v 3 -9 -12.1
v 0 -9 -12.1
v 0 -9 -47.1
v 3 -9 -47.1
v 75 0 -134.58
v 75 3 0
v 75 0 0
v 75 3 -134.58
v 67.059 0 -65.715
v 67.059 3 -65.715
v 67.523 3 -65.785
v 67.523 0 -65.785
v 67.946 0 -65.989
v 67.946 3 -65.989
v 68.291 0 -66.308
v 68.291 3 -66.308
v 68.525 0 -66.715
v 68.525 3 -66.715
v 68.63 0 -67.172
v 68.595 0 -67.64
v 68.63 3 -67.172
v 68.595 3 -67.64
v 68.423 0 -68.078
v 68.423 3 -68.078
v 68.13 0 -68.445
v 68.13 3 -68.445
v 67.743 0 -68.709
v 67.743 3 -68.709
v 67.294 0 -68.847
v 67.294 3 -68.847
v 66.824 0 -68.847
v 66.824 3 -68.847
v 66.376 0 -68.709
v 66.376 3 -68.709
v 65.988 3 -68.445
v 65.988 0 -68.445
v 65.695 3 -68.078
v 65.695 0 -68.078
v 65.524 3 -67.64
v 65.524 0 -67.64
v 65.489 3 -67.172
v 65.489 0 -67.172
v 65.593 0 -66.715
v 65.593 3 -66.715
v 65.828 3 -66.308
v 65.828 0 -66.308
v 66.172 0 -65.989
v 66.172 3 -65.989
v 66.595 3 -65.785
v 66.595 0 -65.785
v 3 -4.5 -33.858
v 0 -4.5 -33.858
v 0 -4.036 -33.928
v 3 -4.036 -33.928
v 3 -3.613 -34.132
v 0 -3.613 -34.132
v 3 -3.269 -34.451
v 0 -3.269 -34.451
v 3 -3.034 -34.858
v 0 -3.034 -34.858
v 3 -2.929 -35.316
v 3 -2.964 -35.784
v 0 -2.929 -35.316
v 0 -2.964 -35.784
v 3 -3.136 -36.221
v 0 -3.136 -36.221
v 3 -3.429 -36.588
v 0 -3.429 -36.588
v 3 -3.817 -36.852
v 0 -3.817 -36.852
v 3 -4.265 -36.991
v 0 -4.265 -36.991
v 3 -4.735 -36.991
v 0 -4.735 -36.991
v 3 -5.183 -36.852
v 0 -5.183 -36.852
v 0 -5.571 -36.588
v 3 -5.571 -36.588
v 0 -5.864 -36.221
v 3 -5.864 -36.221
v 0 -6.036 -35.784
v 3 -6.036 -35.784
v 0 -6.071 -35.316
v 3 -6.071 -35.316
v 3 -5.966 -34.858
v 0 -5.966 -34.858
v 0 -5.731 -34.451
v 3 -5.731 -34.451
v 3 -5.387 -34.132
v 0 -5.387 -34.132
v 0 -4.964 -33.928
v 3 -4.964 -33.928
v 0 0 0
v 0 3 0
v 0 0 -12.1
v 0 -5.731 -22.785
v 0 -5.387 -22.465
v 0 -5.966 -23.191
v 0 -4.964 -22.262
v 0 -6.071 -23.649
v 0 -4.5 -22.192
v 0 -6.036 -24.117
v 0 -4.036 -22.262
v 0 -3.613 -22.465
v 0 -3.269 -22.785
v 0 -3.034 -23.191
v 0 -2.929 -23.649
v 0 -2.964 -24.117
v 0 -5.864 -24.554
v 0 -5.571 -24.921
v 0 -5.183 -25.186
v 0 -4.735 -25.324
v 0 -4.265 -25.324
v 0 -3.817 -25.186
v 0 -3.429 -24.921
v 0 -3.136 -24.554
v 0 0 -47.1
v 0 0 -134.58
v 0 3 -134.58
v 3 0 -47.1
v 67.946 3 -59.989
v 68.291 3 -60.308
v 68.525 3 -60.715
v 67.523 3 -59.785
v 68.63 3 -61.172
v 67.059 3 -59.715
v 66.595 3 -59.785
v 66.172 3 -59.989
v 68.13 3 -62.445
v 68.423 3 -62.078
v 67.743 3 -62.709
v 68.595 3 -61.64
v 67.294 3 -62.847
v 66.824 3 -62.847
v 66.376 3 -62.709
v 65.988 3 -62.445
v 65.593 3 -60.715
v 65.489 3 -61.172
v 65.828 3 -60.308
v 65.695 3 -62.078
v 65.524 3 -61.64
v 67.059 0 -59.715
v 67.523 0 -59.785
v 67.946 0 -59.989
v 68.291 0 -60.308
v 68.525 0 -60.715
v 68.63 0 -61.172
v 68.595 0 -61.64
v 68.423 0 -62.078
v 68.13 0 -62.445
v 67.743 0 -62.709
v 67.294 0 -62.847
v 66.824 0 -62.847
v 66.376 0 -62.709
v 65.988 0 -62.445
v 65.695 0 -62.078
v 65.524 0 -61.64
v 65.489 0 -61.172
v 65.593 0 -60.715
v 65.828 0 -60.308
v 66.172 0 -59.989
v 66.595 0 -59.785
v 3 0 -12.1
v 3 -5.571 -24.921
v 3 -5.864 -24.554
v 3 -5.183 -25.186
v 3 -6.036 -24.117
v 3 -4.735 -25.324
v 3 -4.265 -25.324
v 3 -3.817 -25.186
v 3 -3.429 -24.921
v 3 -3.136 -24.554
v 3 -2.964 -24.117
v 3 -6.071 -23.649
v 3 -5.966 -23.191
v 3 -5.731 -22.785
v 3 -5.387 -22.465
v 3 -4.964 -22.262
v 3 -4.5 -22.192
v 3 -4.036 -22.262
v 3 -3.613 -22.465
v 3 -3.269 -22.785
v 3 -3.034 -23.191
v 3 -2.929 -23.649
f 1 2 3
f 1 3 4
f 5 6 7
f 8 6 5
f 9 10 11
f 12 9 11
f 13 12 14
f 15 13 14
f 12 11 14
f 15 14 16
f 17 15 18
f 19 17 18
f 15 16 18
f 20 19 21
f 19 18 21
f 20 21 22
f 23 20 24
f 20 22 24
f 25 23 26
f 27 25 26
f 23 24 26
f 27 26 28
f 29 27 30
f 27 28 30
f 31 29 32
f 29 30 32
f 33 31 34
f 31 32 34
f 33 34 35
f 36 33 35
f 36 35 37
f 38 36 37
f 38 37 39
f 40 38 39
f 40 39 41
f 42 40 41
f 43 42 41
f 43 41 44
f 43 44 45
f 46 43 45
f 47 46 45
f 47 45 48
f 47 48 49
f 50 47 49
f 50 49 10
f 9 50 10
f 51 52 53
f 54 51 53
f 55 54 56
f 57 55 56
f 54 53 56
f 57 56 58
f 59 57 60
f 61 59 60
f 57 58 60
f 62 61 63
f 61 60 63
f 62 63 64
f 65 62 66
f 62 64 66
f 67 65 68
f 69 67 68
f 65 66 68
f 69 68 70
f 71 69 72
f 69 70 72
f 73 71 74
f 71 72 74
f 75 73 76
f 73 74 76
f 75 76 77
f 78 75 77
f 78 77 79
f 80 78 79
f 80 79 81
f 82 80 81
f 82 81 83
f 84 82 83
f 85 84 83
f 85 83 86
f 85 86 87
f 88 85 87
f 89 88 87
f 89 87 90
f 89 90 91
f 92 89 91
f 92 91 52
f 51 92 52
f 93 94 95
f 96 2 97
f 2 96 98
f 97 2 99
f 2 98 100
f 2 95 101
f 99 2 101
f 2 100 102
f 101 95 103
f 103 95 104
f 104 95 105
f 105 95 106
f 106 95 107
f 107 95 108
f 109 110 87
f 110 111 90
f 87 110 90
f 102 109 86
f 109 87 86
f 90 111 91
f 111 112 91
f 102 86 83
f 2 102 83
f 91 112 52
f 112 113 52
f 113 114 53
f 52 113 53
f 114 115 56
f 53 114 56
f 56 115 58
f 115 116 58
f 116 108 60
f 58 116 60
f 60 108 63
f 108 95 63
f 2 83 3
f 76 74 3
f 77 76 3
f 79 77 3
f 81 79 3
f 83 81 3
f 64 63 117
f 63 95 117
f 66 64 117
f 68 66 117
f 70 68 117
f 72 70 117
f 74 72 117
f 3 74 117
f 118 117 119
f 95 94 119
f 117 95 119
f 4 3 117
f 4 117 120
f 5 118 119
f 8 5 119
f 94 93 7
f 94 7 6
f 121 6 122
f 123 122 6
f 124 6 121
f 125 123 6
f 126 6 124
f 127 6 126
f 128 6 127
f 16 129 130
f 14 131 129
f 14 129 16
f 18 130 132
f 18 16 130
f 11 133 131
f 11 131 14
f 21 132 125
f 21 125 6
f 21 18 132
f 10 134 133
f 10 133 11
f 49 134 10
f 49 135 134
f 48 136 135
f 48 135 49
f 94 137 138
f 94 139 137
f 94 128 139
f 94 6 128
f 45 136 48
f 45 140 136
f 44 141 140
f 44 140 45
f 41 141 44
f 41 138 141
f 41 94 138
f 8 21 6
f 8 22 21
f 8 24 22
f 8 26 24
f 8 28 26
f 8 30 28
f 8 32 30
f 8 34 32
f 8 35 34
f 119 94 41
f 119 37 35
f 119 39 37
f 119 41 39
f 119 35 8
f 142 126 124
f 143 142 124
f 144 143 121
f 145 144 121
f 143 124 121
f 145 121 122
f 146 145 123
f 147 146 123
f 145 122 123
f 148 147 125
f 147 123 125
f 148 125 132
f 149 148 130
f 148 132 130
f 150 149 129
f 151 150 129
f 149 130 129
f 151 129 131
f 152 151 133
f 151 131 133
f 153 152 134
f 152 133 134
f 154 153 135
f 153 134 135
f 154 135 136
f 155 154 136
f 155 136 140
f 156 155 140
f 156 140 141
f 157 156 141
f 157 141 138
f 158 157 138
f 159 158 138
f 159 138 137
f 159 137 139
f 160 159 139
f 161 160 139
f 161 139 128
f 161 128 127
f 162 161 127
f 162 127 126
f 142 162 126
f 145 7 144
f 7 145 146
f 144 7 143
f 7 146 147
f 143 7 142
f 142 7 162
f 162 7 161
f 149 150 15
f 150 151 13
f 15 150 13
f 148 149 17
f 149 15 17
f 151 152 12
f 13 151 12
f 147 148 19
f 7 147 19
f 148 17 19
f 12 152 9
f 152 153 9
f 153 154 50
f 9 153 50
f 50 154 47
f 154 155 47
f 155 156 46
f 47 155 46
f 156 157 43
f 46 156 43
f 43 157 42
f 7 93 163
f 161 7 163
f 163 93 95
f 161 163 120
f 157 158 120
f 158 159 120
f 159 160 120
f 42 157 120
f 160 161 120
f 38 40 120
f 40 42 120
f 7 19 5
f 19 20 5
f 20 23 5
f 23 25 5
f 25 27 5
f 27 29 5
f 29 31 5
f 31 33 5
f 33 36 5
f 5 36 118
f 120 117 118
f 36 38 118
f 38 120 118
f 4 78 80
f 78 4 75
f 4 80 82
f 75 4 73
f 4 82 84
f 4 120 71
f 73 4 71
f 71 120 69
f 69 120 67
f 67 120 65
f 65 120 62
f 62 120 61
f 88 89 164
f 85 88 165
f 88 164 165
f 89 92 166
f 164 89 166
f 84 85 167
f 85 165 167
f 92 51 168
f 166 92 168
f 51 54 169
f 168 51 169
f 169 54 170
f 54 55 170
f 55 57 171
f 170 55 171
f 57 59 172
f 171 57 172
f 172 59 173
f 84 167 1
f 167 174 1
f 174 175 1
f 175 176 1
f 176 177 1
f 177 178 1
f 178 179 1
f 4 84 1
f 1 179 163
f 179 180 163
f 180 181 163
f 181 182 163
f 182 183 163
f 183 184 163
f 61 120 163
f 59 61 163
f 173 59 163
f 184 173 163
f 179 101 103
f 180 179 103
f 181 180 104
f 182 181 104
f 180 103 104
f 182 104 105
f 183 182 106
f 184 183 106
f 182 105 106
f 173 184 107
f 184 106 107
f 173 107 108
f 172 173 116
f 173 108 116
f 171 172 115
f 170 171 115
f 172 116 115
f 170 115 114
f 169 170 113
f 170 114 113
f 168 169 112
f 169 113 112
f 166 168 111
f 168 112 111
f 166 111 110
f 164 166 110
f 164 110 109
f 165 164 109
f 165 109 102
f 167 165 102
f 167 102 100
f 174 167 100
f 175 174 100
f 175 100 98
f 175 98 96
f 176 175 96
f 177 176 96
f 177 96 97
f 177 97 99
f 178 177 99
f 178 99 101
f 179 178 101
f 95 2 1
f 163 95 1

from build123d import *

# Parameters (mm, degrees)
SKETCH1_W           = 134.58
SKETCH1_H           = 3
BOSS_EXTRUDE1_DEPTH = 75
SKETCH2_W           = 3
SKETCH2_H           = 35
BOSS_EXTRUDE2_DEPTH = 9
SKETCH3_R           = 1.575
CUT_EXTRUDE1_DEPTH  = 155.330089095
SKETCH5_R           = 1.575
CUT_EXTRUDE2_DEPTH  = 155.534062265


with BuildPart() as part:
    # Sketch1 → Boss-Extrude1 (new body)
    with BuildSketch(Plane(origin=(0, 0, 0), x_dir=(0, 0, -1), z_dir=(1, 0, 0))):
        with Locations((67.29, 1.5)):
            Rectangle(SKETCH1_W, SKETCH1_H)
    extrude(amount=BOSS_EXTRUDE1_DEPTH)

    # Sketch2 → Boss-Extrude2 (add)
    with BuildSketch(Plane.XZ):
        with Locations((1.5, -29.6)):
            Rectangle(SKETCH2_W, SKETCH2_H)
    extrude(amount=BOSS_EXTRUDE2_DEPTH)

    # Sketch3 → Cut-Extrude1 (cut, through all)
    with BuildSketch(Plane.ZY):
        with Locations((-23.766666667, -4.5)):
            Circle(SKETCH3_R)
        with Locations((-35.433333333, -4.5)):
            Circle(SKETCH3_R)
    extrude(amount=-CUT_EXTRUDE1_DEPTH, mode=Mode.SUBTRACT)

    # Sketch5 → Cut-Extrude2 (cut, through all)
    with BuildSketch(Plane(origin=(0, 3, 0), x_dir=(1, 0, 0), z_dir=(0, 1, 0))):
        with Locations(Location((67.059177496, 61.29, 0), (0, 0, 270))):
            Circle(SKETCH5_R)
        with Locations(Location((67.059177496, 67.29, 0), (0, 0, 270))):
            Circle(SKETCH5_R)
    extrude(amount=-CUT_EXTRUDE2_DEPTH, mode=Mode.SUBTRACT)


solid = part.part
